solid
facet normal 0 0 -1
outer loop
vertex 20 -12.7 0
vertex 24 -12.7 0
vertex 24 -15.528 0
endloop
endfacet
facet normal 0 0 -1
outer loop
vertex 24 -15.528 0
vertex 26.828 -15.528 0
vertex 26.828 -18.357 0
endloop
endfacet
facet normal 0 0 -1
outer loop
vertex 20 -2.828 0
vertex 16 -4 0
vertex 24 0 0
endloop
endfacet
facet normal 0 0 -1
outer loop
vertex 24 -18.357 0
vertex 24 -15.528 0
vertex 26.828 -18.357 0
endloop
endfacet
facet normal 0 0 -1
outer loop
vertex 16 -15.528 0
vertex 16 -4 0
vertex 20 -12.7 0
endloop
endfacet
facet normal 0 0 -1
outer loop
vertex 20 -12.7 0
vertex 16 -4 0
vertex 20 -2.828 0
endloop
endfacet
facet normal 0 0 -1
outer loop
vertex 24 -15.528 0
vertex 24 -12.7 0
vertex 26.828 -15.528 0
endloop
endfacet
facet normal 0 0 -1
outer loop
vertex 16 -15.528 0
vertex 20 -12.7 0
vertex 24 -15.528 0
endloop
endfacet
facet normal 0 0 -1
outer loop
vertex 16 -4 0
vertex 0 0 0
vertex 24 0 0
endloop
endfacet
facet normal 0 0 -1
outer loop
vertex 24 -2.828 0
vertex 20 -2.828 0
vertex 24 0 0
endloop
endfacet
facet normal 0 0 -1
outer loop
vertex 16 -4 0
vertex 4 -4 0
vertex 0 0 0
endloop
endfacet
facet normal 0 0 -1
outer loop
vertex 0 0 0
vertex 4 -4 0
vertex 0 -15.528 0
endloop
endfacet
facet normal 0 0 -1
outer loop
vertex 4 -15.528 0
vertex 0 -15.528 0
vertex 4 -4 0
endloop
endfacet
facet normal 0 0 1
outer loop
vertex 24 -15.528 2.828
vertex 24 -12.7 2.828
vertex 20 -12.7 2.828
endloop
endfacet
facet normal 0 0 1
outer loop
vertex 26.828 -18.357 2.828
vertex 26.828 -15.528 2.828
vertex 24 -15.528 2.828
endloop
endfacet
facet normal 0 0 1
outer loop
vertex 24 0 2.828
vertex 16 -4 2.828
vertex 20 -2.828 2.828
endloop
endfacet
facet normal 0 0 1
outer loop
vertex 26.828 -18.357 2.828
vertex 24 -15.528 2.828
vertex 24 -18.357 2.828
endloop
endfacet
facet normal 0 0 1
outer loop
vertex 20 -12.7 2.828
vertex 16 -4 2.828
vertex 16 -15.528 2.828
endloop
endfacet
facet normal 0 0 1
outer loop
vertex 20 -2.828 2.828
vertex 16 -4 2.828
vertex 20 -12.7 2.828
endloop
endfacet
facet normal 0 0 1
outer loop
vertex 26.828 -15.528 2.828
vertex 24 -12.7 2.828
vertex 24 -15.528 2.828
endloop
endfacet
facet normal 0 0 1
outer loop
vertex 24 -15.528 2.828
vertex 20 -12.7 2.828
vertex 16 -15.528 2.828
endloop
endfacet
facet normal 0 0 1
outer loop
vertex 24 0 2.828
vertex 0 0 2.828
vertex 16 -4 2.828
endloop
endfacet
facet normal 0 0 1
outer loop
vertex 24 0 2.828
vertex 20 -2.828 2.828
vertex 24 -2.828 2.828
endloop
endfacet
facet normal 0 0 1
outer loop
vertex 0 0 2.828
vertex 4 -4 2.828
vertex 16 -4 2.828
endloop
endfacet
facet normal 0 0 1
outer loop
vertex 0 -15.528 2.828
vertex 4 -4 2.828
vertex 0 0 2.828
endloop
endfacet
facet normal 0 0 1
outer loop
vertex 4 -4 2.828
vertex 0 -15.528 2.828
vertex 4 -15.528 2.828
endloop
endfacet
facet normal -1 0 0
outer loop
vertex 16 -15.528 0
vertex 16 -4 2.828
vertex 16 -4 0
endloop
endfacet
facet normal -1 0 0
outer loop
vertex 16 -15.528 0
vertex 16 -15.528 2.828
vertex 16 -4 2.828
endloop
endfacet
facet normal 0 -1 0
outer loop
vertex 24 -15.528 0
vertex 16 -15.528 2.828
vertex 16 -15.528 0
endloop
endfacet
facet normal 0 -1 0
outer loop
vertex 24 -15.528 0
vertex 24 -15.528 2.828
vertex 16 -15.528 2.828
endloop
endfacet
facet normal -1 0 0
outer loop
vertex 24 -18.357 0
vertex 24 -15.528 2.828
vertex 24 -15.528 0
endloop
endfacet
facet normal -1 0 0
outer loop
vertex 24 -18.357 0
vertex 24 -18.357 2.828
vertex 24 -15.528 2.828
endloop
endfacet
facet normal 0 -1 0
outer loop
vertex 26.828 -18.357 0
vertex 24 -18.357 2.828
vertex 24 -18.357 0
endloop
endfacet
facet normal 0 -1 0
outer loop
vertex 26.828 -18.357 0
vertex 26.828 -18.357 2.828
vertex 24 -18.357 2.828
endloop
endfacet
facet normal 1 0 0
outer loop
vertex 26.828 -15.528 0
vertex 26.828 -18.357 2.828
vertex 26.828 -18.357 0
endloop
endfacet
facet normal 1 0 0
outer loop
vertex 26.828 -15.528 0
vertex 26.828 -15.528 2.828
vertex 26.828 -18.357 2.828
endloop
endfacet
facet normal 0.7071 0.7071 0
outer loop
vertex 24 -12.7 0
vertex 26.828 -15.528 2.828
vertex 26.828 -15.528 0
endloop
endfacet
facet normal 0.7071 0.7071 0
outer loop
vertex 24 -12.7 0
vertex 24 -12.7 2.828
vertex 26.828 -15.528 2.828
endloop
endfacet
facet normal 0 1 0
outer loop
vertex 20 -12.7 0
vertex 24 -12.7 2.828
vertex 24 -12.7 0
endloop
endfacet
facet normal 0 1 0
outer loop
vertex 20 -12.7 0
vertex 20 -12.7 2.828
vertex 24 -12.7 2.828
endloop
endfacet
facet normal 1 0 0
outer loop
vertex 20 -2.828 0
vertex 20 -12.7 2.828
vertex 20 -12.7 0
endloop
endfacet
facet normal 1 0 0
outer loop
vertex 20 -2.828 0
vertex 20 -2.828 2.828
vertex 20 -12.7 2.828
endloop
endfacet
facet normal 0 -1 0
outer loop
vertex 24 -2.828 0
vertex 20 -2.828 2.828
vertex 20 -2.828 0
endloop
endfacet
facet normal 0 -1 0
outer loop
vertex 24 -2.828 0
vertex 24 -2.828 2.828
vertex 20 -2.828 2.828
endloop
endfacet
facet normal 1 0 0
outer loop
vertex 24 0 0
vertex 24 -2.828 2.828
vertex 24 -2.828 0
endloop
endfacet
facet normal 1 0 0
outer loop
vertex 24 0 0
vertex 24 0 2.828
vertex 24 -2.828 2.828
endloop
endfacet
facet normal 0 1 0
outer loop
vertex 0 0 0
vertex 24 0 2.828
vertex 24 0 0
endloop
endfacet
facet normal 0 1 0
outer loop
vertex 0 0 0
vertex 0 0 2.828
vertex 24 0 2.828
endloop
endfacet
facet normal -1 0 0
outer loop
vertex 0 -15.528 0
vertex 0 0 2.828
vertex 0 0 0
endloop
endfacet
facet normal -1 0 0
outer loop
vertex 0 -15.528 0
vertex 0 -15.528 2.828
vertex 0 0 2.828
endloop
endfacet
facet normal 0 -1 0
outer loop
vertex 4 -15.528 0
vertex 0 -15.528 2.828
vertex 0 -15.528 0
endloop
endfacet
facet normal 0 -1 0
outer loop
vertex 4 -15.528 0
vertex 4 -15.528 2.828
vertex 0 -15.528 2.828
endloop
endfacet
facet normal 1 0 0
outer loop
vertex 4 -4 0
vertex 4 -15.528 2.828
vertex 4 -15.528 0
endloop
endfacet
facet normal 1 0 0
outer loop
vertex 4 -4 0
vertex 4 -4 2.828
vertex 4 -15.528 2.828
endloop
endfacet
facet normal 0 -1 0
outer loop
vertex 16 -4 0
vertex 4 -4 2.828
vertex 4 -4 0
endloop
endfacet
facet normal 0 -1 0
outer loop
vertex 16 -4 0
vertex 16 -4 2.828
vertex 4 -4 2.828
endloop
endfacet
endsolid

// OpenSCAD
/** Pegboard settings */
hole_size = 4;
hole_spacing = 25.4/2;
board_thickness = 4;

peg_square_side = sqrt(pow(hole_size, 2)/2);

thickness = 4;

module peg_fitting() {
   depth = 20;
   height = hole_spacing+peg_square_side;
   peg_depth = board_thickness;
   difference() {
     polygon(points = [
      [0, 0] 
      ,[0, -height]
      ,[depth, -height]
      ,[depth+peg_depth, -height]
      ,[depth+peg_depth, -height-peg_square_side]
      ,[depth+peg_depth+peg_square_side, -height-peg_square_side]
      ,[depth+peg_depth+peg_square_side, -height]
      ,[depth+peg_depth, -height+peg_square_side]
      ,[depth, -height+peg_square_side]

      ,[depth, -peg_square_side]
      ,[depth+peg_depth, -peg_square_side]
      ,[depth+peg_depth, 0]
    ]);
     
    polygon(points = [
      [thickness, -thickness]
      ,[thickness, -height]
      ,[depth - thickness, -height]
      ,[depth - thickness, -thickness]
    ]);
  }
}

linear_extrude(peg_square_side) {
    peg_fitting();
}
  
